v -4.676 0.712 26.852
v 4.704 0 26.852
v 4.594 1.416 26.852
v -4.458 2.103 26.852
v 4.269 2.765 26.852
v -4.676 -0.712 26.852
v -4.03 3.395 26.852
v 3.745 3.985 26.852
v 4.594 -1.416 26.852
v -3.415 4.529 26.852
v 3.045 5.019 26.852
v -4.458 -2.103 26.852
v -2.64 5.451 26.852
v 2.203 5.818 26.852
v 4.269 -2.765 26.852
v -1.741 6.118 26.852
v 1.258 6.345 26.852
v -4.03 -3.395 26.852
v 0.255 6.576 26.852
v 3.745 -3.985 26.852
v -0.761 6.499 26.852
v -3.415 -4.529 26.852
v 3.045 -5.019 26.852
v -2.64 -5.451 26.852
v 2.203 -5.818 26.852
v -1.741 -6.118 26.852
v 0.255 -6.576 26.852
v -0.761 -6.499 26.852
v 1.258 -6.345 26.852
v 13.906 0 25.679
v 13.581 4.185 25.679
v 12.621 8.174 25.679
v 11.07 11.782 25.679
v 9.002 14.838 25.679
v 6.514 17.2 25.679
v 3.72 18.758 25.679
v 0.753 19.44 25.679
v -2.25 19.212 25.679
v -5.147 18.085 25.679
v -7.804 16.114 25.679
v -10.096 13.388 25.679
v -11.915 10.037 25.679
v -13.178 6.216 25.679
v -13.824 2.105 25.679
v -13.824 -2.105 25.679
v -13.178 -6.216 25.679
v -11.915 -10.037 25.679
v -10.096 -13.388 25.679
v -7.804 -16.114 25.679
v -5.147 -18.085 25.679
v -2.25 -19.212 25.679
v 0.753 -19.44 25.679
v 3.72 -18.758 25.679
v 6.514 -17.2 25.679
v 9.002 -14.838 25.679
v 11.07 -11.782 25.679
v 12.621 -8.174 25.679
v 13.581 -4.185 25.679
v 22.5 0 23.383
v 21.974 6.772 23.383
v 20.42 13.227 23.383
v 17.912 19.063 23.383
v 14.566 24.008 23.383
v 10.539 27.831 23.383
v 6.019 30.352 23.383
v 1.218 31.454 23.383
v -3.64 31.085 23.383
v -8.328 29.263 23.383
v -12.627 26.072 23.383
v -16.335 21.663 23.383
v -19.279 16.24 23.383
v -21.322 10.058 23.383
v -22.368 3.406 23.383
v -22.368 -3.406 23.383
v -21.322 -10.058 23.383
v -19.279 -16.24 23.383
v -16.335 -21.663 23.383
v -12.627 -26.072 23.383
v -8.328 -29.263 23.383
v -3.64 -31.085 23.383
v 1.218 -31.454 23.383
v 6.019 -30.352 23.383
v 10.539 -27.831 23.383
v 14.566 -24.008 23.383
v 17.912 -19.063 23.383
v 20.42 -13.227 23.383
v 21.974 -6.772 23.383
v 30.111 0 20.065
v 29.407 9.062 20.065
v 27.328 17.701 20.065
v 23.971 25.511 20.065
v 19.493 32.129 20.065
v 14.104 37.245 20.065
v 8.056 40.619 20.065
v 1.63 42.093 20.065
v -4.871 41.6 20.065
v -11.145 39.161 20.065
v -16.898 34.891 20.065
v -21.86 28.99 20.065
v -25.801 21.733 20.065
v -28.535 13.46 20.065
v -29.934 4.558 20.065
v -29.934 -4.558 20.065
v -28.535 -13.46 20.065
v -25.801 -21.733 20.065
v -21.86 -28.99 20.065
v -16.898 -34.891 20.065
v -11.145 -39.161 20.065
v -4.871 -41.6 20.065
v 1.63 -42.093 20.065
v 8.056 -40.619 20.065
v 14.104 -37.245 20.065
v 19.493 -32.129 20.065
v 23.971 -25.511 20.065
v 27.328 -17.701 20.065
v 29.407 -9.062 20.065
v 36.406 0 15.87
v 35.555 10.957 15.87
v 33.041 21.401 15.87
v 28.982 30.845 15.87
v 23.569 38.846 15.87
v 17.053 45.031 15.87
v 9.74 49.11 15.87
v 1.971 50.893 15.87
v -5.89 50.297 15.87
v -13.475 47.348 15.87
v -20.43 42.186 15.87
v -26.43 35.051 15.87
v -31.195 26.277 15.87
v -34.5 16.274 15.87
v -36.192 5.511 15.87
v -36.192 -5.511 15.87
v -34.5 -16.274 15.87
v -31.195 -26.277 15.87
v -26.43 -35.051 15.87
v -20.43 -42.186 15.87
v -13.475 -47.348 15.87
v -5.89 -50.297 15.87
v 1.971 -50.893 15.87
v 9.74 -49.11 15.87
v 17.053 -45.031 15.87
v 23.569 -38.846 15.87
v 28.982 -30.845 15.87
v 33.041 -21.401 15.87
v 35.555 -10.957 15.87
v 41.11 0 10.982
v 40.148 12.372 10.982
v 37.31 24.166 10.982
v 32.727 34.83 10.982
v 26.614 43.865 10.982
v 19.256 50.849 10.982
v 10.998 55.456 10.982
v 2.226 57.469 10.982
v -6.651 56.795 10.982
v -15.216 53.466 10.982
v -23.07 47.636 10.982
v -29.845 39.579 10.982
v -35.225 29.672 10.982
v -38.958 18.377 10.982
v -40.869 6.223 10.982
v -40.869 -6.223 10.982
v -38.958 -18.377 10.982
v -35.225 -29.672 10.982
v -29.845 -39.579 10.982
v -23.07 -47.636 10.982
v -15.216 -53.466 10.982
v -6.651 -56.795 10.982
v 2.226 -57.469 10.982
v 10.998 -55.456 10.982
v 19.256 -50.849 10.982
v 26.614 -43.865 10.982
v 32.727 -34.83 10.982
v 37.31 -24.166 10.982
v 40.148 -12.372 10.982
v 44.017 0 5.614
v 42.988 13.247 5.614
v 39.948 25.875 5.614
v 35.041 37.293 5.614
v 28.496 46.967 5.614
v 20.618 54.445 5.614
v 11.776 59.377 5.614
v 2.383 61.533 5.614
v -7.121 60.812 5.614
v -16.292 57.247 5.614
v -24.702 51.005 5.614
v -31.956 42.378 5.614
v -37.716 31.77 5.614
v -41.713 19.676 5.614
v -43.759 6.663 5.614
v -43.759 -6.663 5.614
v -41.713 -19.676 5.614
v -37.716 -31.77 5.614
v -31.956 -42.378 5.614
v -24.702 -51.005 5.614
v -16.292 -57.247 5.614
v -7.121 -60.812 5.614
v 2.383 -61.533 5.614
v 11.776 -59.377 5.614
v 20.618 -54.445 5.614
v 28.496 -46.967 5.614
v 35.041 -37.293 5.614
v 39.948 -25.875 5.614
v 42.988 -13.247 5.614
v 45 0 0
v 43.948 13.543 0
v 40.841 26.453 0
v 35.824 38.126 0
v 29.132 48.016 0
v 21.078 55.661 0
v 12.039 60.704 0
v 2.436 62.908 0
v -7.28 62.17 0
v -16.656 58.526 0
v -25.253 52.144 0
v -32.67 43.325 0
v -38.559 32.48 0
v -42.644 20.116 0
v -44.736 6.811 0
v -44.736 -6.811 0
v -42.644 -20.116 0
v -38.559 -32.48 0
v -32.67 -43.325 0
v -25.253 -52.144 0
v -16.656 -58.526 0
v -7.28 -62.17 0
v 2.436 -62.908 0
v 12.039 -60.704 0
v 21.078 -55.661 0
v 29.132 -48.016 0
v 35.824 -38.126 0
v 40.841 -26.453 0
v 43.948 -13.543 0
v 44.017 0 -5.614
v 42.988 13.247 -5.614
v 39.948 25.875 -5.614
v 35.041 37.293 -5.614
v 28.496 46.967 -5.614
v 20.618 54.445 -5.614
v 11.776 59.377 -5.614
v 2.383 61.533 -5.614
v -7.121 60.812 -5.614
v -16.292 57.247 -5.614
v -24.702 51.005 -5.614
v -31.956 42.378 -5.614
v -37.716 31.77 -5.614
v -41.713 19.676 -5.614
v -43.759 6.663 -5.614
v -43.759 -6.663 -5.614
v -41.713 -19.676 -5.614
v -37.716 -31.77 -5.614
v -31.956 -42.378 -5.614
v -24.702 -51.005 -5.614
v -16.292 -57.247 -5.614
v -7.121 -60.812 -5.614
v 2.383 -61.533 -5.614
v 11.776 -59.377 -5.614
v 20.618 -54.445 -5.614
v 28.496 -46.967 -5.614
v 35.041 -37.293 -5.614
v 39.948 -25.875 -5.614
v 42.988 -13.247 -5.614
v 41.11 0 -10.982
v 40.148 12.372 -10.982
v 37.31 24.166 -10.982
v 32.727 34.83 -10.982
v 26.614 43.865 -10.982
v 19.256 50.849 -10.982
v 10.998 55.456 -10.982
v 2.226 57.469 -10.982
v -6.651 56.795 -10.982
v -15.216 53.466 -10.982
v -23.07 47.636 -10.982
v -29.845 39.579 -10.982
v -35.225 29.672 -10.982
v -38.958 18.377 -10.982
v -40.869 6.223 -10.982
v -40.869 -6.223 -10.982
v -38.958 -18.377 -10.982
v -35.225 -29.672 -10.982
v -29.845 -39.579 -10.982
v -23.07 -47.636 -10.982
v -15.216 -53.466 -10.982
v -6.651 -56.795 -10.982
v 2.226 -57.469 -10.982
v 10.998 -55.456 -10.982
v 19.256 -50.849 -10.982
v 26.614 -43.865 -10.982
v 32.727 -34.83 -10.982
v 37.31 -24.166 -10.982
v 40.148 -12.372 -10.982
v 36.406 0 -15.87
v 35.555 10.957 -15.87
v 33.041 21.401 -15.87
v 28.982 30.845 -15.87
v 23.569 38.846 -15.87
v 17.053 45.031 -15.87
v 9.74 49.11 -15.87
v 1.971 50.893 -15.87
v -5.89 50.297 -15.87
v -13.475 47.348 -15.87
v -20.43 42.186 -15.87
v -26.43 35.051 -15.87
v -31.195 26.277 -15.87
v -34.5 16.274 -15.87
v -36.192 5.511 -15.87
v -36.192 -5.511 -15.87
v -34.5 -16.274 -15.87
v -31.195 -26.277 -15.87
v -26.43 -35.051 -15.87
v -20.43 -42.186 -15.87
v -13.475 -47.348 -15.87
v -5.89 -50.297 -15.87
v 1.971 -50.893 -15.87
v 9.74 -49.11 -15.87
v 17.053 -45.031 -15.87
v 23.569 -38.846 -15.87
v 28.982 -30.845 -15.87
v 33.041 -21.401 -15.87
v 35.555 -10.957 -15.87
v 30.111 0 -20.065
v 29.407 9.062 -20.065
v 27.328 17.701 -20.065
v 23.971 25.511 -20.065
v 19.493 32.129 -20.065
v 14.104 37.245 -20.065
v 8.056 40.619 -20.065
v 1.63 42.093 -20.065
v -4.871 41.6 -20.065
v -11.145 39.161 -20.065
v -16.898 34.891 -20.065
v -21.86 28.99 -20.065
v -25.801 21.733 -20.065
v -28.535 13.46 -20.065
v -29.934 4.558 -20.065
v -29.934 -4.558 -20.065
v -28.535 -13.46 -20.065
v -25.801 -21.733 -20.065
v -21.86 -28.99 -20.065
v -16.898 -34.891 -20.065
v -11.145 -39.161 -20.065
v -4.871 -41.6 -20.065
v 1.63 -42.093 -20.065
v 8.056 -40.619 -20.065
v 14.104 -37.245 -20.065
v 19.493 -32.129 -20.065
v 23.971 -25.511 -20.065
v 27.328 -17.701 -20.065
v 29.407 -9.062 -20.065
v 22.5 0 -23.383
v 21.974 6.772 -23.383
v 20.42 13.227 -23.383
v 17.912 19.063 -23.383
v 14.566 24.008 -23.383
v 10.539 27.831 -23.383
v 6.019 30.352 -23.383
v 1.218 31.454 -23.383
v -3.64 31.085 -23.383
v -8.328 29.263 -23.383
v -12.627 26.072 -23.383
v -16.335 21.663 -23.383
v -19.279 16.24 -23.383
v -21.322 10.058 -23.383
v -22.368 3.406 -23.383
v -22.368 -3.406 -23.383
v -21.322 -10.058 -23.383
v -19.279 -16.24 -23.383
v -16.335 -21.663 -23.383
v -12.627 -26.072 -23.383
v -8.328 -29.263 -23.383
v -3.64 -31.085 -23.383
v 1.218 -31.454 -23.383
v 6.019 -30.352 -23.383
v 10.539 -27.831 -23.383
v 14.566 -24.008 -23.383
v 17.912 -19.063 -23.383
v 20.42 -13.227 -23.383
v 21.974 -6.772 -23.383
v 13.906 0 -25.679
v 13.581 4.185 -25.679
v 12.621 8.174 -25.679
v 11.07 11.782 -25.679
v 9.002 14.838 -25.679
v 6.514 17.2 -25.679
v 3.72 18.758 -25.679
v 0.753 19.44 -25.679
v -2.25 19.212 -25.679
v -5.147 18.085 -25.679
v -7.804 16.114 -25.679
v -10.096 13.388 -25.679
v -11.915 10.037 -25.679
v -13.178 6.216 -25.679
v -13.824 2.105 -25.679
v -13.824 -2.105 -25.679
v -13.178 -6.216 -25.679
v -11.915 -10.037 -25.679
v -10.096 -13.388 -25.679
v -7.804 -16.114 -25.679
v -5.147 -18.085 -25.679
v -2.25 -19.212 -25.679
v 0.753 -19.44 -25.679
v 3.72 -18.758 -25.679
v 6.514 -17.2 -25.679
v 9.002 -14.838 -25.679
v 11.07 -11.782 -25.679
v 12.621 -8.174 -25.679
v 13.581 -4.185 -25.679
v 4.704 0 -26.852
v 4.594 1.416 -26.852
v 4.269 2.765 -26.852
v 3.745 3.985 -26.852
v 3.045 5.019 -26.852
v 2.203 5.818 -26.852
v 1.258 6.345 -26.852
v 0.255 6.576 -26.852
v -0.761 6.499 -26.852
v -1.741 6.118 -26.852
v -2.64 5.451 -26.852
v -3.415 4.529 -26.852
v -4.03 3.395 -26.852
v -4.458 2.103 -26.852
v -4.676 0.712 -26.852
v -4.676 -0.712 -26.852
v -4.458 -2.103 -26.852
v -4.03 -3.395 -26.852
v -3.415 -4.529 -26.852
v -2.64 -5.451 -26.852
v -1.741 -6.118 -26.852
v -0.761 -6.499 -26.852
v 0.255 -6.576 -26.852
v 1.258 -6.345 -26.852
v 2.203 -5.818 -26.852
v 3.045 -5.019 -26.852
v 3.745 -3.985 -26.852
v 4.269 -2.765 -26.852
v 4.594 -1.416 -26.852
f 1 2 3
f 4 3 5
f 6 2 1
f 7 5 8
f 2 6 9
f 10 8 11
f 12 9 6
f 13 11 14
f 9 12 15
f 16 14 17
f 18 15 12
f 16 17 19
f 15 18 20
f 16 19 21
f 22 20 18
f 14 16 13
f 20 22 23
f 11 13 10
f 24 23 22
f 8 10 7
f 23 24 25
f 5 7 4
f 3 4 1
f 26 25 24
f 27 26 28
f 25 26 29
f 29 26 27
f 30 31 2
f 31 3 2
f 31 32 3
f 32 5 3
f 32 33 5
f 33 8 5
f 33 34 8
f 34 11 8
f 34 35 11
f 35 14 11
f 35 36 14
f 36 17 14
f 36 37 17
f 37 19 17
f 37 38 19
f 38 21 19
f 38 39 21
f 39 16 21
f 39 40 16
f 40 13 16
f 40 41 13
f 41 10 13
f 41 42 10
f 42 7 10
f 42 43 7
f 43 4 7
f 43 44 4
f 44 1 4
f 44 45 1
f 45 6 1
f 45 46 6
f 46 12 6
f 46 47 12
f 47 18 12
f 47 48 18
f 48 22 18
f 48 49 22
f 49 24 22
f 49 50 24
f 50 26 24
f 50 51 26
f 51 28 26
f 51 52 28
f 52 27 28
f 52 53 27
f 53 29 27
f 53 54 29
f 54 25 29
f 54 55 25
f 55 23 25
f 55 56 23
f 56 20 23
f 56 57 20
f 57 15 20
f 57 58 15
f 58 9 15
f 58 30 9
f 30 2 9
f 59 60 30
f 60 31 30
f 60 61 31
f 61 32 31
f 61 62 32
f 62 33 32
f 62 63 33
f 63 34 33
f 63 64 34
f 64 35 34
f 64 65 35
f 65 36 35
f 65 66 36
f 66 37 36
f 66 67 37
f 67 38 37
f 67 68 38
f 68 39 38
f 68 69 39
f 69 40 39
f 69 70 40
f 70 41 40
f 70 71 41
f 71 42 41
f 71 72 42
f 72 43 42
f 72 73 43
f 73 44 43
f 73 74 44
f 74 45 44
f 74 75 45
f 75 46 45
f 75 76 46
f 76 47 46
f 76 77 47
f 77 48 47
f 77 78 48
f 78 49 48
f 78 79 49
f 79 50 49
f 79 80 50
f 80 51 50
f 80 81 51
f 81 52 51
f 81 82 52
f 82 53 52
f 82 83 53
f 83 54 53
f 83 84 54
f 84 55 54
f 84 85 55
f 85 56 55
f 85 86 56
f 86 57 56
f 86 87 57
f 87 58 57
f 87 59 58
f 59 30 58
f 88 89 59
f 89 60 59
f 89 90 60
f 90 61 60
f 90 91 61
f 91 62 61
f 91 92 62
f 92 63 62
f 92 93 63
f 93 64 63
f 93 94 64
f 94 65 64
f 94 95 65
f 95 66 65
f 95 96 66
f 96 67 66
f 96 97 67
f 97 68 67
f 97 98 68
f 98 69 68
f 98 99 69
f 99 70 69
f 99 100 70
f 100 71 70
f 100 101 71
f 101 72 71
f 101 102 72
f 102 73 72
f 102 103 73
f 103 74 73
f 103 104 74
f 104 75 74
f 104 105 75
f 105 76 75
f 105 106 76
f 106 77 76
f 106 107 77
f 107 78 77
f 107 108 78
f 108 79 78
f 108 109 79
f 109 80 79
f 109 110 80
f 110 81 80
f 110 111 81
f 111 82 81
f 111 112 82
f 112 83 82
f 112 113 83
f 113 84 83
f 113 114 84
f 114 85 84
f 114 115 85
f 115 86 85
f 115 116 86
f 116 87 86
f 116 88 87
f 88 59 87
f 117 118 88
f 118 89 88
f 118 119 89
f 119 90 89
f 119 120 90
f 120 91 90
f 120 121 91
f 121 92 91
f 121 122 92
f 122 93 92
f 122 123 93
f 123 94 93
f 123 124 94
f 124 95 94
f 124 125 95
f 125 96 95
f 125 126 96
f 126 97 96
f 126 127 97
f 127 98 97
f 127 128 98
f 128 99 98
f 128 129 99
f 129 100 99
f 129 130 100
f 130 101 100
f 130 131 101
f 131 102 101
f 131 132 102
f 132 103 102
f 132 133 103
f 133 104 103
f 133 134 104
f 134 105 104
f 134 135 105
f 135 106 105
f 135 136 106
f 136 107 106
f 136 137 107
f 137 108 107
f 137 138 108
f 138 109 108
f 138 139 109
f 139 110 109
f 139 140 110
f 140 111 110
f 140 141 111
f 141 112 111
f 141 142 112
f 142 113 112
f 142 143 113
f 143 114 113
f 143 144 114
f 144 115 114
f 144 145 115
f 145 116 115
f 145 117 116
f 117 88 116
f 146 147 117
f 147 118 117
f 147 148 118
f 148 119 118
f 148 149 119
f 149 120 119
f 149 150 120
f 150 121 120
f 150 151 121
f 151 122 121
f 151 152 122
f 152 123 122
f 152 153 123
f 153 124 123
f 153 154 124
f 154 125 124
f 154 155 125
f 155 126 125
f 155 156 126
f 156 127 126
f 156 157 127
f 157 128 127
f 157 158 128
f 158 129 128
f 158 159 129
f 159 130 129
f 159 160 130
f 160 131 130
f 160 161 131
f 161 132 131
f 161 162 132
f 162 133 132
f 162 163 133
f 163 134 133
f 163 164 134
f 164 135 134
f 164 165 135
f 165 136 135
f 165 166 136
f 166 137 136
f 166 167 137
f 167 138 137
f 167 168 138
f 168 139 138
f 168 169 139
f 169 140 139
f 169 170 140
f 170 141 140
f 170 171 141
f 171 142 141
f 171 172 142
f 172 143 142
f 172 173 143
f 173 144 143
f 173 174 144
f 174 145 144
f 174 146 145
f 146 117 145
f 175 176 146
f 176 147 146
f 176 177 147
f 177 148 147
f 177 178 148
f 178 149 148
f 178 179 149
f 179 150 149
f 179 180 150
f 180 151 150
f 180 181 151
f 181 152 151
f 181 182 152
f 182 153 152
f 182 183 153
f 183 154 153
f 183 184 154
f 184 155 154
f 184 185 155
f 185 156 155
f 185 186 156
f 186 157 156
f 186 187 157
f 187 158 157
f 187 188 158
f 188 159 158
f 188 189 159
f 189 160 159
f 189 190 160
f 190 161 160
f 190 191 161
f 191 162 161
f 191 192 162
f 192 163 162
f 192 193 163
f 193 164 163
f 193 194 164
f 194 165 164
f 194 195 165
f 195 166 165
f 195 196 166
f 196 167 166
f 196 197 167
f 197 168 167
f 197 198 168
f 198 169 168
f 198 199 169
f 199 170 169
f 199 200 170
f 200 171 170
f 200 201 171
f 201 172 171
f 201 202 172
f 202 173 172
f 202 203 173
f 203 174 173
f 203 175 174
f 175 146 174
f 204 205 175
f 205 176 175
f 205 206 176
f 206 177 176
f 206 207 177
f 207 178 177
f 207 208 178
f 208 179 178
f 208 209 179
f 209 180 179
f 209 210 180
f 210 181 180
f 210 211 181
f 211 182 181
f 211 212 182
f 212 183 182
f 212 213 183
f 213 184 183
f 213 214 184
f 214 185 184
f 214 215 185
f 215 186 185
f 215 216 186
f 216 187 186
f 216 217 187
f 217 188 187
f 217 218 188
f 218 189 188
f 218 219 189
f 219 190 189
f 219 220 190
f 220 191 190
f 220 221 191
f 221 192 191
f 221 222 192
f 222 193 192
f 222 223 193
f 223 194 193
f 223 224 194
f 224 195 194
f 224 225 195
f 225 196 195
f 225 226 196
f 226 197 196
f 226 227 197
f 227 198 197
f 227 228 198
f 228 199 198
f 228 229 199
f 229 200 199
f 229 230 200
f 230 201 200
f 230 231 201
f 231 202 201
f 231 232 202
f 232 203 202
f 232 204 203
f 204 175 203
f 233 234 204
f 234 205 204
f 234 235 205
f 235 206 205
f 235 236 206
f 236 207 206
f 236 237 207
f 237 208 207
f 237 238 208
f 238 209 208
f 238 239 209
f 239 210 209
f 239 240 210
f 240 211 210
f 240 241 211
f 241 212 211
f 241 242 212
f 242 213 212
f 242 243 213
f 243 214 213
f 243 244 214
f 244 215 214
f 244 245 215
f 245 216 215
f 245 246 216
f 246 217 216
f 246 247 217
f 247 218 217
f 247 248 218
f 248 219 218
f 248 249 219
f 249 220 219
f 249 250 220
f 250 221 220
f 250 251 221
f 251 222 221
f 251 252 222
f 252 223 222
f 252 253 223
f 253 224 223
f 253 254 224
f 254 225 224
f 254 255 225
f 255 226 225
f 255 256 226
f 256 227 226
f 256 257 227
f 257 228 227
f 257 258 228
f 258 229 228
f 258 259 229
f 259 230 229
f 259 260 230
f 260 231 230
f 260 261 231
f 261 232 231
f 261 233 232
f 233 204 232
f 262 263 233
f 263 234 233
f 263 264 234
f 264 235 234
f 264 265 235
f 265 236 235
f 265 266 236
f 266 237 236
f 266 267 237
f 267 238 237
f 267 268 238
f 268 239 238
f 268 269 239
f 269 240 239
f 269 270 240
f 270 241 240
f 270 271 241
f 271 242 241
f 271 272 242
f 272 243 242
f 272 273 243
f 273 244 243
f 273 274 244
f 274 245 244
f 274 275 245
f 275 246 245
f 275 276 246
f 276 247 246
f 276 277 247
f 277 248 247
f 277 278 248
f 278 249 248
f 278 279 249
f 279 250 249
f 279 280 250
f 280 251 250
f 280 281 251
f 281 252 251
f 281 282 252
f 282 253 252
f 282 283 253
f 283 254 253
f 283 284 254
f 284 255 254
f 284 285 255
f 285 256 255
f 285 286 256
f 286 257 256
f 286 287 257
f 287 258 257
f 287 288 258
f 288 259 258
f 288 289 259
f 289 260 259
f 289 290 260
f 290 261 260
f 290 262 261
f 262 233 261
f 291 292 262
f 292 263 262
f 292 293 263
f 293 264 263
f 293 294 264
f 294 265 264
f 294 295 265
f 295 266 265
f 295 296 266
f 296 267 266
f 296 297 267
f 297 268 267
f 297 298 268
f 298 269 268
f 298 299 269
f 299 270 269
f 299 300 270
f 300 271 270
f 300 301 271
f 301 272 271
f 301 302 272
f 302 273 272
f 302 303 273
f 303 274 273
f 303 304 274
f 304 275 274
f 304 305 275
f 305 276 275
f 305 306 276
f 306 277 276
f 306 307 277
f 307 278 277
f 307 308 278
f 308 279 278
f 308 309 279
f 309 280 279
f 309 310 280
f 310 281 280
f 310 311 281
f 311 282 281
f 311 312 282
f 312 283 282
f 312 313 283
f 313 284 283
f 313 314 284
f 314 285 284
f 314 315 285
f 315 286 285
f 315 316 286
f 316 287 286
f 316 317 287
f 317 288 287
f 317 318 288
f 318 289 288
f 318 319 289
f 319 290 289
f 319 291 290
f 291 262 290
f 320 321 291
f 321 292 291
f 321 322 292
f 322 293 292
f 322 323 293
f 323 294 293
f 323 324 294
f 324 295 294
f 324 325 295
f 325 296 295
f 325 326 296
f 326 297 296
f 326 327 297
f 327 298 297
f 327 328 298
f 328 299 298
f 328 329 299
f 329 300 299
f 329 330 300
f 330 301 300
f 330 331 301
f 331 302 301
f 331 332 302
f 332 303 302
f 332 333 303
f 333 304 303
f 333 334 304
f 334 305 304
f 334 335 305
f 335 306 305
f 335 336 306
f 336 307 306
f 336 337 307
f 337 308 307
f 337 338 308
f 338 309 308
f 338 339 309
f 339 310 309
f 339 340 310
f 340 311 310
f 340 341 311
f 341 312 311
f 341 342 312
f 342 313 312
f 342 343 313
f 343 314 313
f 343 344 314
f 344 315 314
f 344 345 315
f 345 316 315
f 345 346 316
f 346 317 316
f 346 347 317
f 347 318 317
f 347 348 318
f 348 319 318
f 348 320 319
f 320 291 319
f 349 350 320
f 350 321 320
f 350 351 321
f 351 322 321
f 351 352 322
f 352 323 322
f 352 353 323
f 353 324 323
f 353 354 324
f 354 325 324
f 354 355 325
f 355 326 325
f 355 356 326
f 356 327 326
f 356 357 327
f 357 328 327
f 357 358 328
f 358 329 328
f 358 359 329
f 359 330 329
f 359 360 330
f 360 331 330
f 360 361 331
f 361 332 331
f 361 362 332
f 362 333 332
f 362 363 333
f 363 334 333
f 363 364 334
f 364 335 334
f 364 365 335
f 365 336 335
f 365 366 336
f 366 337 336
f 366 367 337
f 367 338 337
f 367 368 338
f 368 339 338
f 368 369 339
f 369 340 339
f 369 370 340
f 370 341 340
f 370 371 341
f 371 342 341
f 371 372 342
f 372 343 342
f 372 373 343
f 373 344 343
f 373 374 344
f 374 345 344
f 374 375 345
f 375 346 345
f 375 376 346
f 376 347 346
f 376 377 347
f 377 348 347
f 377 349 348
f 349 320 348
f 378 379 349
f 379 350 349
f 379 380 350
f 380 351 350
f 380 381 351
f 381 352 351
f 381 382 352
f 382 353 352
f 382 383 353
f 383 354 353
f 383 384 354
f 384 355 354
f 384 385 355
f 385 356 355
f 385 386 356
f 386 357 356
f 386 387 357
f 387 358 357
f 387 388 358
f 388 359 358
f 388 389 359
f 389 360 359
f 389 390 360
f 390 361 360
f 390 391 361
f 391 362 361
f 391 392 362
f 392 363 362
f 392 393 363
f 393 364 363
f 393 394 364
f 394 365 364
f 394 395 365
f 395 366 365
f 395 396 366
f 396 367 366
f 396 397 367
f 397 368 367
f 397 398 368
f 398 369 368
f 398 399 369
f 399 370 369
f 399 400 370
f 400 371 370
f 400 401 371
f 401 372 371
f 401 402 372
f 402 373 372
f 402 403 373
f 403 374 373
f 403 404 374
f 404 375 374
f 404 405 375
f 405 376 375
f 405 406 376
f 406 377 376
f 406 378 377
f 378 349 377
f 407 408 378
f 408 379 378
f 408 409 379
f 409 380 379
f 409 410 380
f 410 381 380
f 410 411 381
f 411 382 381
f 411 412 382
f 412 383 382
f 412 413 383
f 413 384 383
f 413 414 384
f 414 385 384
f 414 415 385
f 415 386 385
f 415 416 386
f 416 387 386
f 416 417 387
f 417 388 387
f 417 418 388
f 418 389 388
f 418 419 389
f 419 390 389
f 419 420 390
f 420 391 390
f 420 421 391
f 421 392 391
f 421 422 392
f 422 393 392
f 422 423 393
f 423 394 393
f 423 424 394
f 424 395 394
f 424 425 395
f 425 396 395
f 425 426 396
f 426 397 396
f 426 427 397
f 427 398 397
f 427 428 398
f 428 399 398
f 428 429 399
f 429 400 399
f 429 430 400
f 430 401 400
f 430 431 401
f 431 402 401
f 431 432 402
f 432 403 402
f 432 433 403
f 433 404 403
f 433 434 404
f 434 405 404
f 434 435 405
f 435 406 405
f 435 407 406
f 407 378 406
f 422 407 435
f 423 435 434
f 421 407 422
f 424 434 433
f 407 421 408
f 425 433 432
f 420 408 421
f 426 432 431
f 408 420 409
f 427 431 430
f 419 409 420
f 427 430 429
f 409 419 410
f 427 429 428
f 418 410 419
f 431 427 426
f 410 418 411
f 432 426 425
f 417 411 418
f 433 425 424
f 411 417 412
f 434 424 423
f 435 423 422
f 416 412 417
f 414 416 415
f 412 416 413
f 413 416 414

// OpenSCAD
// Generated by SolidPython 1.0.1 on 2020-07-29 00:46:46


scale(v = [5, 7, 3]) {
	sphere(r = 9);
}
/***********************************************
*********      SolidPython code:      **********
************************************************
 
# import packages: SolidPython
from solid import *
from solid.utils import *
from itertools import chain, combinations, permutations


class Resize:

    def __init__(self, scad_file):
        self.scad_file = scad_file
        #self.scad_file = import_scad(scad_file)
        # cone/cylinder param:
        self.r1 = 0
        self.r2 = 0
        self.h = 0
        # rectangular prism param:
        self.w = 0
        self.l = 0
        # ellipse param:
        self.r = 0

    # import OpenScad code (file name corresponds to shape)


    # classify shape + parameters
    def assign(self, param1, param2, param3):
        if self.scad_file == 'cone.scad':
            self.r1 = param1
            self.r2 = param2
            self.h = param3
        elif self.scad_file == 'cylinder.scad':
            self.r1 = param1
            self.r2 = param2
            self.h = param3
        elif self.scad_file == 'rectangularPrism.scad':
            self.h = param1
            self.l = param2
            self.w = param3
        else:
            self.r = param1
            self.h = param2

    # resize parameters
    def iterate(self):
        x = range(3, 20, 2)
        i = 1
        if self.scad_file == 'cone.scad':
            tempList = list(permutations(x, 2))
            for temp in tempList:
                param1 = temp[0]
                param2 = temp[1]
                filepath = 'produced_scad_files/' + 'cone' + str(param1) + '_' + str(param2) + '_' + '.scad'
                scad_render_to_file(cylinder(h=param1, r1=param2, r2=0), filepath)

        elif self.scad_file == 'cylinder.scad':
            tempList = list(permutations(x, 3))
            for temp in tempList:
                param1 = temp[0]
                param2 = temp[1]
                filepath = 'produced_scad_files/' + 'cylinder' + str(param1) + '_' + str(param2) + '_' + '.scad'
                scad_render_to_file(cylinder(h=param1, r1=param2, r2=param2), filepath)

        elif self.scad_file == 'rectangularPrism.scad':
            tempList = list(permutations(x, 3))
            for temp in tempList:
                param1 = temp[0]
                param2 = temp[1]
                param3 = temp[2]
                filepath = 'produced_scad_files/' + 'rectangularPrism' + str(param1) + '_' + str(param2) + '_' + str(
                    param3) + '.scad'
                scad_render_to_file(cube(size=(param1, param2, param3)), filepath)

        elif self.scad_file == 'ellipse.scad':
            tempList = list(permutations(x, 4))
            for temp in tempList:
                param1 = temp[0]
                param2 = temp[1]
                param3 = temp[2]
                param4 = temp[3]
                filepath = 'produced_scad_files/' + 'ellipse' + str(param1) + '_' + str(param2) + '_' + str(param3) + '_' + str(param4) + '.scad'
                scad_render_to_file(scale([param1, param2, param3])(sphere(r=param4)), filepath)

    def render_to_scadfile(self):
        scad_render_to_file(scad, 'example.scad') 
 
************************************************/
